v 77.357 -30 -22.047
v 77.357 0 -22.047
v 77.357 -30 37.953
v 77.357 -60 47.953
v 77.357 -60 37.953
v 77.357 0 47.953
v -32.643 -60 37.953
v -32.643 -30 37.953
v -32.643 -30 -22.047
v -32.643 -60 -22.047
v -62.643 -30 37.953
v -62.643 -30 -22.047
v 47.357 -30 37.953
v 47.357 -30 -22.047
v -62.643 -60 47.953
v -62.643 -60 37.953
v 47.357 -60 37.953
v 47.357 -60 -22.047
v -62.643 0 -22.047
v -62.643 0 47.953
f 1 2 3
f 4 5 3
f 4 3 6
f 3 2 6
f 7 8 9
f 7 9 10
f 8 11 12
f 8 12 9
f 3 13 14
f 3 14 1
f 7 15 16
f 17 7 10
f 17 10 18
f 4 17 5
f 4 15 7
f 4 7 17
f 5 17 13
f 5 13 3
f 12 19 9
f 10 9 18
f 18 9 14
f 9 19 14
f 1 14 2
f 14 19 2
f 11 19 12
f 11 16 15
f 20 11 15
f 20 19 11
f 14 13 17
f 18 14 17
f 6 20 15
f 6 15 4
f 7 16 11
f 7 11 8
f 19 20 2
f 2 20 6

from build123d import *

# Parameters (mm, degrees)
F0_W     = 140
F0_H     = 70
F1_DEPTH = 60
F2_W     = 30
F2_H     = 30
F3_DEPTH = 60
F4_W     = 30
F4_H     = 30
F5_DEPTH = 60


with BuildPart() as f1:
    # F0 (on Front) → F1 (new body)
    with BuildSketch(Plane.XZ):
        with Locations((7.357027, 12.952588)):
            Rectangle(F0_W, F0_H)
    extrude(amount=F1_DEPTH)

    # F2 (on face) → F3 (cut)
    with BuildSketch(Plane(origin=(0, 0, -22.047412), x_dir=(1, 0, 0), z_dir=(0, 0, -1))):
        with Locations((-47.642973, 45)):
            Rectangle(F2_W, F2_H)
    extrude(amount=-F3_DEPTH, mode=Mode.SUBTRACT)

    # F4 (on face) → F5 (cut)
    with BuildSketch(Plane(origin=(0, 0, -22.047412), x_dir=(1, 0, 0), z_dir=(0, 0, -1))):
        with Locations((62.357027, 45)):
            Rectangle(F4_W, F4_H)
    extrude(amount=-F5_DEPTH, mode=Mode.SUBTRACT)


solid = f1.part
